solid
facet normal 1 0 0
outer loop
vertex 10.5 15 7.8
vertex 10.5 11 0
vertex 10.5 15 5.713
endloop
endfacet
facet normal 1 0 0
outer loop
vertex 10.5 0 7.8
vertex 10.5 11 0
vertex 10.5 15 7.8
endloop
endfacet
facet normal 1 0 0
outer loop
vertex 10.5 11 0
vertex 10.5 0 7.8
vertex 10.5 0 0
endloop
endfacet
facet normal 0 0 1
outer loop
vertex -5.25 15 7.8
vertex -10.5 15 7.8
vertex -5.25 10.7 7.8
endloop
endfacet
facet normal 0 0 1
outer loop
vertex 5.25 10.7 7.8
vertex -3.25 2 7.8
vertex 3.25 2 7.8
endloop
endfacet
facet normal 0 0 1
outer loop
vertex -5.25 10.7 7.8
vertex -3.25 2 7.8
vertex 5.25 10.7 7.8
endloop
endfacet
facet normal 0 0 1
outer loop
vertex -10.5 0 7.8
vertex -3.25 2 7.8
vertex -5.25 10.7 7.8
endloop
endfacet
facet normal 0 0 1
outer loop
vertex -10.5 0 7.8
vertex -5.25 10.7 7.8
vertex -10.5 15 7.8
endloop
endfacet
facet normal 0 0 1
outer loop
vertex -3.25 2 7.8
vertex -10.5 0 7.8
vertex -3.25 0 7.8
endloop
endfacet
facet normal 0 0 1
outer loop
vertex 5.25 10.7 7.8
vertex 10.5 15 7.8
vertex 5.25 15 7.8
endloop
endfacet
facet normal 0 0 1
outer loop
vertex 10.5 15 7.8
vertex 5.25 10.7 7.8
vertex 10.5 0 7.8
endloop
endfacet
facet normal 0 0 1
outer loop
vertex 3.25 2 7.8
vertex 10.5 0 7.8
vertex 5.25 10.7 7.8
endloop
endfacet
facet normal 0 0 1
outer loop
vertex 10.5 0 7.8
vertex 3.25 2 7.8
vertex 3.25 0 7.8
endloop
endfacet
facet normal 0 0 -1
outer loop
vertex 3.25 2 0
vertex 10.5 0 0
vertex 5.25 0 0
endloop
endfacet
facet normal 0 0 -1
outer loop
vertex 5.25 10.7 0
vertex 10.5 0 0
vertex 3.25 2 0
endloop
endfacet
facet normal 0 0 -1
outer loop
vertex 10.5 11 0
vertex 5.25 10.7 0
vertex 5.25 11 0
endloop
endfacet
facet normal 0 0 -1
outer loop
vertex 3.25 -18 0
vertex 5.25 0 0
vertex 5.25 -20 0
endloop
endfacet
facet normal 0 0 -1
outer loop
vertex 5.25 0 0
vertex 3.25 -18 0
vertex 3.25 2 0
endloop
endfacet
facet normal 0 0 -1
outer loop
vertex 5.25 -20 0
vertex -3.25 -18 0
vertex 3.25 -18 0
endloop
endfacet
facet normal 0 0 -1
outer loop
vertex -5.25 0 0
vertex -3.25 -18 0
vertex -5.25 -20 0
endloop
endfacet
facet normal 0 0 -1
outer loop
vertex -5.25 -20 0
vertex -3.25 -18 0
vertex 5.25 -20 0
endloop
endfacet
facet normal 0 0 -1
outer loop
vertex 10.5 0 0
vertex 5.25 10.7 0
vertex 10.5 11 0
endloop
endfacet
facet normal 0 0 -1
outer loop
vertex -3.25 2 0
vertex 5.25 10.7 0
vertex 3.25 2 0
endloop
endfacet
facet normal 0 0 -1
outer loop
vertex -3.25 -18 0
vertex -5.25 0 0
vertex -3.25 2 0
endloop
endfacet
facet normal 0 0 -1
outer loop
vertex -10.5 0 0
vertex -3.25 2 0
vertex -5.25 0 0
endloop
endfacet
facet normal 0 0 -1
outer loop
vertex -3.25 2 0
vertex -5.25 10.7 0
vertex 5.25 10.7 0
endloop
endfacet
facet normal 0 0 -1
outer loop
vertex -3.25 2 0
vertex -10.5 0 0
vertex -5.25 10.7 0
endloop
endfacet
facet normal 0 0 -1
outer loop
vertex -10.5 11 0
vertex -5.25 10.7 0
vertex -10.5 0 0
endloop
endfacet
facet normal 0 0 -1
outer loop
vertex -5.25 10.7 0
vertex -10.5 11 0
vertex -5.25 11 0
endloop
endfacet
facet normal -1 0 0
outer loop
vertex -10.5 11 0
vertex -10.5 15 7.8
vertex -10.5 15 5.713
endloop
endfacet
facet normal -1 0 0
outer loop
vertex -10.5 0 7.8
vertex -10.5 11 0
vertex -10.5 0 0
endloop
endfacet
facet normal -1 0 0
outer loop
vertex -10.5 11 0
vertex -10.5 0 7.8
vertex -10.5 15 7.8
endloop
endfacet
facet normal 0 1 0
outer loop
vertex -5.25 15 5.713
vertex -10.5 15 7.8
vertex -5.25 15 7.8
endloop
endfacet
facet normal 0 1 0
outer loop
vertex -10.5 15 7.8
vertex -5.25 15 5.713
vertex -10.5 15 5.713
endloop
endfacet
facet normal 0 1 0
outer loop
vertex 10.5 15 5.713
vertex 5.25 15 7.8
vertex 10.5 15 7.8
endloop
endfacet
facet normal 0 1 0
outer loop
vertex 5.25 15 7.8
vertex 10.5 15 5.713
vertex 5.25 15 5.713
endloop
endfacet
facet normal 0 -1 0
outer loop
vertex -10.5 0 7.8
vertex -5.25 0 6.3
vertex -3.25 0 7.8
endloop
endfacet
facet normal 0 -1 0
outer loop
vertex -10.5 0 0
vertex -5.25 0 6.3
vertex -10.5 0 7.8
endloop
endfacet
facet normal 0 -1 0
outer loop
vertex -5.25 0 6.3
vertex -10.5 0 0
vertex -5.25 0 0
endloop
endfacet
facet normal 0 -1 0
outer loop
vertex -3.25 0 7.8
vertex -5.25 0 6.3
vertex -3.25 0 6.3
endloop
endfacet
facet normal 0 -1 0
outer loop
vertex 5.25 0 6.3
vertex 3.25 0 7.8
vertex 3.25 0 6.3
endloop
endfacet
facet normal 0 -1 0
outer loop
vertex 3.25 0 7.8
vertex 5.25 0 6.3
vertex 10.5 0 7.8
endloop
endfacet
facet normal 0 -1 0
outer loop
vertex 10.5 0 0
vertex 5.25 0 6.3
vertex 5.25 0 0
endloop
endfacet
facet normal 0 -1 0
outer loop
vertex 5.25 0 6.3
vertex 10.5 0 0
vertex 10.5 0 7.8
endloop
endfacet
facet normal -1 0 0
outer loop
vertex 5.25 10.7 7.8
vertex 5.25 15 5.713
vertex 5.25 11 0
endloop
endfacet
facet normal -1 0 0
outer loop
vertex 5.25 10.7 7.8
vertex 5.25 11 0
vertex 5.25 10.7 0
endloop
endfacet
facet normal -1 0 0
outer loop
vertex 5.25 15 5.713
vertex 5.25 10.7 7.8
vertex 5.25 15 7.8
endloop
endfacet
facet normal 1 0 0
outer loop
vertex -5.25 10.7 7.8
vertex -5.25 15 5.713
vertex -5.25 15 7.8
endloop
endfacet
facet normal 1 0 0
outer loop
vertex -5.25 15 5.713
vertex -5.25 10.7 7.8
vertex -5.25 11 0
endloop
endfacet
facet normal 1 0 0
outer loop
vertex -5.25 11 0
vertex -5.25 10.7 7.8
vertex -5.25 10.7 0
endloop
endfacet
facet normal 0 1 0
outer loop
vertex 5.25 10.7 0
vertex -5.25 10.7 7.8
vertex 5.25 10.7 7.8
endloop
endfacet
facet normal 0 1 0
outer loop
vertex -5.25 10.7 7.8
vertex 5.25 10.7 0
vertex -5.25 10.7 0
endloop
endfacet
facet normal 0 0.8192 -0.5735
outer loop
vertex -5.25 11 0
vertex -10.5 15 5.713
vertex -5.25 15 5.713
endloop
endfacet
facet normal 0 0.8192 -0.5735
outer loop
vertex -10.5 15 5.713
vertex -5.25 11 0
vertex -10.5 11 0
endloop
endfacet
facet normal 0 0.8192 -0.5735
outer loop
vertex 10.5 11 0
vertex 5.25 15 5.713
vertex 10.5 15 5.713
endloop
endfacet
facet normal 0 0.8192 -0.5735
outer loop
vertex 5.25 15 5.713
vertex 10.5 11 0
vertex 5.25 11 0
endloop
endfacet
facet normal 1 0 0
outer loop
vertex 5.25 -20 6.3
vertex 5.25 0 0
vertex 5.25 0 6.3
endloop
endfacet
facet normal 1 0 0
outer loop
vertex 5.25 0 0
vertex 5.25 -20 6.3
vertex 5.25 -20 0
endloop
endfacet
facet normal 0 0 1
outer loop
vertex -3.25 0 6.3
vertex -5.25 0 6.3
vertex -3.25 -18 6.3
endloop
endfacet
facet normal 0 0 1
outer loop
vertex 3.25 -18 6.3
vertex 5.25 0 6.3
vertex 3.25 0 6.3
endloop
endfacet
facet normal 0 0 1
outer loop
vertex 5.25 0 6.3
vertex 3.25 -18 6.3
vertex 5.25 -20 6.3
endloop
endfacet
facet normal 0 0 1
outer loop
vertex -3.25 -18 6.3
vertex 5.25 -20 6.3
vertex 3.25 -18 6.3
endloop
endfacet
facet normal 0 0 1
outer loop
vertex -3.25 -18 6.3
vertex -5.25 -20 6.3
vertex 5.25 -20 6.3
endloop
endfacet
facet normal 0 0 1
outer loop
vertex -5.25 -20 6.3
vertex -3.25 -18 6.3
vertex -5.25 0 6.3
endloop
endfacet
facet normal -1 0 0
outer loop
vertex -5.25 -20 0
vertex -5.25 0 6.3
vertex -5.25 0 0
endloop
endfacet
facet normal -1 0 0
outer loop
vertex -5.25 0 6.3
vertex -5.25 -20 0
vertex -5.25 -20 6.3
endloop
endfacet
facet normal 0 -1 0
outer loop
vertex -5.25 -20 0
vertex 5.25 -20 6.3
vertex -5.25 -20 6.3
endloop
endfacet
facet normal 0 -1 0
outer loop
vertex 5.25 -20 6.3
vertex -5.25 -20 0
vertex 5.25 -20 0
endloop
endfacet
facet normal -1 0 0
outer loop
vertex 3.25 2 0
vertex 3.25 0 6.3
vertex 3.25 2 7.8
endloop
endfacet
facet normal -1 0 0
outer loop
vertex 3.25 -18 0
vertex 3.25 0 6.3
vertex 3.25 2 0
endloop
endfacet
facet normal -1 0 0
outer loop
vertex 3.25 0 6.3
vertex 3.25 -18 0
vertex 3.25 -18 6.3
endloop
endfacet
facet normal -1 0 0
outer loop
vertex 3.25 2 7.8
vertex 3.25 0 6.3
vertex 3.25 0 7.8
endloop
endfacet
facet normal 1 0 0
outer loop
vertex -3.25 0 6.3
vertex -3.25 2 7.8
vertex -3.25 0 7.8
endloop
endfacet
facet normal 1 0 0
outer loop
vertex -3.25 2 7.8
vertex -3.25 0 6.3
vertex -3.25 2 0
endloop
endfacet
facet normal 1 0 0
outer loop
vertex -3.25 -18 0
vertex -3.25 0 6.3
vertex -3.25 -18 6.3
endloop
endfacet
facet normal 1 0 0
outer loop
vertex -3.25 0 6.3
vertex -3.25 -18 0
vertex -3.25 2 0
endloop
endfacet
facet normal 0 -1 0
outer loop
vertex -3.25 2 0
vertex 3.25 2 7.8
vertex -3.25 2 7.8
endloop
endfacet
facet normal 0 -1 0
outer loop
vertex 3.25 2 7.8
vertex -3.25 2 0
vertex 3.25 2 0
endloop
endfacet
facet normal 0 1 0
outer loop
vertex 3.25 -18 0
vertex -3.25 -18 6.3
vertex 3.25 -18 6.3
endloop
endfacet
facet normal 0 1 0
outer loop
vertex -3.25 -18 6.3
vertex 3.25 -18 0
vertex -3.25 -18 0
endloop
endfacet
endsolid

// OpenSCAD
// Dish Washer Switch Cap

module DishwasherSwitchCap() {
  difference() {
   union() {
    translate([-21.0/2,0,0]) difference() {
      cube(size=[21.0,15.0,7.8],center=false);
	 translate([21.0/2-10.5/2,14.5-3.8,-0.1])
	  cube(size=[10.5,4.8+0.1,7.8+0.2],center=false);
      translate([-0.1,15.0-4.0,0]) rotate([-35,0,0])
	  cube(size=[21.0+0.2,10.0,10.0],center=false);
    }
    translate([-10.5/2,-20,0]) 
	cube(size=[10.5,24.0,7.8-1.5],center=false);
   }
   translate([-(10.5-4)/2,-20.0+2.0,-0.1])
//	cube(size=[10.5-4.0,20+14.5+0.1,7.8+0.2],center=false);
	cube(size=[10.5-4.0,20,7.8+0.2],center=false);
  }
}

DishwasherSwitchCap();
